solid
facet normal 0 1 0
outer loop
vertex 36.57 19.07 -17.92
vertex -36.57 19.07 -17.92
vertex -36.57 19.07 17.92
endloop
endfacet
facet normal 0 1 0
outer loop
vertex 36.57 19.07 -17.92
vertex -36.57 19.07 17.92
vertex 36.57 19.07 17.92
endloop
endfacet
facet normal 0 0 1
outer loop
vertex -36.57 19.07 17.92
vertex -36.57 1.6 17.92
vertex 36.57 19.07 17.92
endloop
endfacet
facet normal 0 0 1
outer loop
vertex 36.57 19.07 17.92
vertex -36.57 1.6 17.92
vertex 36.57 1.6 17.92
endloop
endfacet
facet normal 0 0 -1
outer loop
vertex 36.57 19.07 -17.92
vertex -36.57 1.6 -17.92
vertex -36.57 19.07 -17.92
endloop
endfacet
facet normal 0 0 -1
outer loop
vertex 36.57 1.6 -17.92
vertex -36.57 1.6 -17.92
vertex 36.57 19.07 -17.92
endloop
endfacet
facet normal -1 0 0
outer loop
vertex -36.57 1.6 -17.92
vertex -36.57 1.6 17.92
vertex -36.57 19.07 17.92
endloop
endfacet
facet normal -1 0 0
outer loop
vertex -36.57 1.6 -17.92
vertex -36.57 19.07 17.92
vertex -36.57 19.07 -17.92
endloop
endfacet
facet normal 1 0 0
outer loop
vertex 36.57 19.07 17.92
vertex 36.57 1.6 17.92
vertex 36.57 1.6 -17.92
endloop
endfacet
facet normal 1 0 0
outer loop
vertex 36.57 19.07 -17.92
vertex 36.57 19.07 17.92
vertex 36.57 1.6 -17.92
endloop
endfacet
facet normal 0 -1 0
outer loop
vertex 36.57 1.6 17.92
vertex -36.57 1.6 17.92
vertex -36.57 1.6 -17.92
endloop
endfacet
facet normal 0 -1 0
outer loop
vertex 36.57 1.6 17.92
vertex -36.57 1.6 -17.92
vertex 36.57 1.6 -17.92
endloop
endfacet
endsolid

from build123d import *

# Parameters (mm, degrees)
SKETCH1_W                 = 76.2
SKETCH1_H                 = 50.8
BOSS_EXTRUDE1_DEPTH       = 1.6
SKETCH2_W                 = 73.14
SKETCH2_H                 = 35.84
BOSS_EXTRUDE2_DEPTH       = 17.47
SKETCH3_W                 = 76.2
SKETCH3_H                 = 50.8
HEAT_SINK_SHAVE_MOD_DEPTH = 1.6


with BuildPart() as part:
    # Sketch1 → Boss-Extrude1 (new body)
    with BuildSketch(Plane(origin=(0, 0, 0), x_dir=(1, 0, 0), z_dir=(0, 1, 0))):
        Rectangle(SKETCH1_W, SKETCH1_H)
    extrude(amount=BOSS_EXTRUDE1_DEPTH)

    # Sketch2 → Boss-Extrude2 (add)
    with BuildSketch(Plane(origin=(0, 1.6, 0), x_dir=(1, 0, 0), z_dir=(0, 1, 0))):
        Rectangle(SKETCH2_W, SKETCH2_H)
    extrude(amount=BOSS_EXTRUDE2_DEPTH)

    # Sketch3 → Heat Sink Shave Mod (cut)
    with BuildSketch(Plane.XZ):
        Rectangle(SKETCH3_W, SKETCH3_H)
    extrude(amount=-HEAT_SINK_SHAVE_MOD_DEPTH, mode=Mode.SUBTRACT)


solid = part.part
